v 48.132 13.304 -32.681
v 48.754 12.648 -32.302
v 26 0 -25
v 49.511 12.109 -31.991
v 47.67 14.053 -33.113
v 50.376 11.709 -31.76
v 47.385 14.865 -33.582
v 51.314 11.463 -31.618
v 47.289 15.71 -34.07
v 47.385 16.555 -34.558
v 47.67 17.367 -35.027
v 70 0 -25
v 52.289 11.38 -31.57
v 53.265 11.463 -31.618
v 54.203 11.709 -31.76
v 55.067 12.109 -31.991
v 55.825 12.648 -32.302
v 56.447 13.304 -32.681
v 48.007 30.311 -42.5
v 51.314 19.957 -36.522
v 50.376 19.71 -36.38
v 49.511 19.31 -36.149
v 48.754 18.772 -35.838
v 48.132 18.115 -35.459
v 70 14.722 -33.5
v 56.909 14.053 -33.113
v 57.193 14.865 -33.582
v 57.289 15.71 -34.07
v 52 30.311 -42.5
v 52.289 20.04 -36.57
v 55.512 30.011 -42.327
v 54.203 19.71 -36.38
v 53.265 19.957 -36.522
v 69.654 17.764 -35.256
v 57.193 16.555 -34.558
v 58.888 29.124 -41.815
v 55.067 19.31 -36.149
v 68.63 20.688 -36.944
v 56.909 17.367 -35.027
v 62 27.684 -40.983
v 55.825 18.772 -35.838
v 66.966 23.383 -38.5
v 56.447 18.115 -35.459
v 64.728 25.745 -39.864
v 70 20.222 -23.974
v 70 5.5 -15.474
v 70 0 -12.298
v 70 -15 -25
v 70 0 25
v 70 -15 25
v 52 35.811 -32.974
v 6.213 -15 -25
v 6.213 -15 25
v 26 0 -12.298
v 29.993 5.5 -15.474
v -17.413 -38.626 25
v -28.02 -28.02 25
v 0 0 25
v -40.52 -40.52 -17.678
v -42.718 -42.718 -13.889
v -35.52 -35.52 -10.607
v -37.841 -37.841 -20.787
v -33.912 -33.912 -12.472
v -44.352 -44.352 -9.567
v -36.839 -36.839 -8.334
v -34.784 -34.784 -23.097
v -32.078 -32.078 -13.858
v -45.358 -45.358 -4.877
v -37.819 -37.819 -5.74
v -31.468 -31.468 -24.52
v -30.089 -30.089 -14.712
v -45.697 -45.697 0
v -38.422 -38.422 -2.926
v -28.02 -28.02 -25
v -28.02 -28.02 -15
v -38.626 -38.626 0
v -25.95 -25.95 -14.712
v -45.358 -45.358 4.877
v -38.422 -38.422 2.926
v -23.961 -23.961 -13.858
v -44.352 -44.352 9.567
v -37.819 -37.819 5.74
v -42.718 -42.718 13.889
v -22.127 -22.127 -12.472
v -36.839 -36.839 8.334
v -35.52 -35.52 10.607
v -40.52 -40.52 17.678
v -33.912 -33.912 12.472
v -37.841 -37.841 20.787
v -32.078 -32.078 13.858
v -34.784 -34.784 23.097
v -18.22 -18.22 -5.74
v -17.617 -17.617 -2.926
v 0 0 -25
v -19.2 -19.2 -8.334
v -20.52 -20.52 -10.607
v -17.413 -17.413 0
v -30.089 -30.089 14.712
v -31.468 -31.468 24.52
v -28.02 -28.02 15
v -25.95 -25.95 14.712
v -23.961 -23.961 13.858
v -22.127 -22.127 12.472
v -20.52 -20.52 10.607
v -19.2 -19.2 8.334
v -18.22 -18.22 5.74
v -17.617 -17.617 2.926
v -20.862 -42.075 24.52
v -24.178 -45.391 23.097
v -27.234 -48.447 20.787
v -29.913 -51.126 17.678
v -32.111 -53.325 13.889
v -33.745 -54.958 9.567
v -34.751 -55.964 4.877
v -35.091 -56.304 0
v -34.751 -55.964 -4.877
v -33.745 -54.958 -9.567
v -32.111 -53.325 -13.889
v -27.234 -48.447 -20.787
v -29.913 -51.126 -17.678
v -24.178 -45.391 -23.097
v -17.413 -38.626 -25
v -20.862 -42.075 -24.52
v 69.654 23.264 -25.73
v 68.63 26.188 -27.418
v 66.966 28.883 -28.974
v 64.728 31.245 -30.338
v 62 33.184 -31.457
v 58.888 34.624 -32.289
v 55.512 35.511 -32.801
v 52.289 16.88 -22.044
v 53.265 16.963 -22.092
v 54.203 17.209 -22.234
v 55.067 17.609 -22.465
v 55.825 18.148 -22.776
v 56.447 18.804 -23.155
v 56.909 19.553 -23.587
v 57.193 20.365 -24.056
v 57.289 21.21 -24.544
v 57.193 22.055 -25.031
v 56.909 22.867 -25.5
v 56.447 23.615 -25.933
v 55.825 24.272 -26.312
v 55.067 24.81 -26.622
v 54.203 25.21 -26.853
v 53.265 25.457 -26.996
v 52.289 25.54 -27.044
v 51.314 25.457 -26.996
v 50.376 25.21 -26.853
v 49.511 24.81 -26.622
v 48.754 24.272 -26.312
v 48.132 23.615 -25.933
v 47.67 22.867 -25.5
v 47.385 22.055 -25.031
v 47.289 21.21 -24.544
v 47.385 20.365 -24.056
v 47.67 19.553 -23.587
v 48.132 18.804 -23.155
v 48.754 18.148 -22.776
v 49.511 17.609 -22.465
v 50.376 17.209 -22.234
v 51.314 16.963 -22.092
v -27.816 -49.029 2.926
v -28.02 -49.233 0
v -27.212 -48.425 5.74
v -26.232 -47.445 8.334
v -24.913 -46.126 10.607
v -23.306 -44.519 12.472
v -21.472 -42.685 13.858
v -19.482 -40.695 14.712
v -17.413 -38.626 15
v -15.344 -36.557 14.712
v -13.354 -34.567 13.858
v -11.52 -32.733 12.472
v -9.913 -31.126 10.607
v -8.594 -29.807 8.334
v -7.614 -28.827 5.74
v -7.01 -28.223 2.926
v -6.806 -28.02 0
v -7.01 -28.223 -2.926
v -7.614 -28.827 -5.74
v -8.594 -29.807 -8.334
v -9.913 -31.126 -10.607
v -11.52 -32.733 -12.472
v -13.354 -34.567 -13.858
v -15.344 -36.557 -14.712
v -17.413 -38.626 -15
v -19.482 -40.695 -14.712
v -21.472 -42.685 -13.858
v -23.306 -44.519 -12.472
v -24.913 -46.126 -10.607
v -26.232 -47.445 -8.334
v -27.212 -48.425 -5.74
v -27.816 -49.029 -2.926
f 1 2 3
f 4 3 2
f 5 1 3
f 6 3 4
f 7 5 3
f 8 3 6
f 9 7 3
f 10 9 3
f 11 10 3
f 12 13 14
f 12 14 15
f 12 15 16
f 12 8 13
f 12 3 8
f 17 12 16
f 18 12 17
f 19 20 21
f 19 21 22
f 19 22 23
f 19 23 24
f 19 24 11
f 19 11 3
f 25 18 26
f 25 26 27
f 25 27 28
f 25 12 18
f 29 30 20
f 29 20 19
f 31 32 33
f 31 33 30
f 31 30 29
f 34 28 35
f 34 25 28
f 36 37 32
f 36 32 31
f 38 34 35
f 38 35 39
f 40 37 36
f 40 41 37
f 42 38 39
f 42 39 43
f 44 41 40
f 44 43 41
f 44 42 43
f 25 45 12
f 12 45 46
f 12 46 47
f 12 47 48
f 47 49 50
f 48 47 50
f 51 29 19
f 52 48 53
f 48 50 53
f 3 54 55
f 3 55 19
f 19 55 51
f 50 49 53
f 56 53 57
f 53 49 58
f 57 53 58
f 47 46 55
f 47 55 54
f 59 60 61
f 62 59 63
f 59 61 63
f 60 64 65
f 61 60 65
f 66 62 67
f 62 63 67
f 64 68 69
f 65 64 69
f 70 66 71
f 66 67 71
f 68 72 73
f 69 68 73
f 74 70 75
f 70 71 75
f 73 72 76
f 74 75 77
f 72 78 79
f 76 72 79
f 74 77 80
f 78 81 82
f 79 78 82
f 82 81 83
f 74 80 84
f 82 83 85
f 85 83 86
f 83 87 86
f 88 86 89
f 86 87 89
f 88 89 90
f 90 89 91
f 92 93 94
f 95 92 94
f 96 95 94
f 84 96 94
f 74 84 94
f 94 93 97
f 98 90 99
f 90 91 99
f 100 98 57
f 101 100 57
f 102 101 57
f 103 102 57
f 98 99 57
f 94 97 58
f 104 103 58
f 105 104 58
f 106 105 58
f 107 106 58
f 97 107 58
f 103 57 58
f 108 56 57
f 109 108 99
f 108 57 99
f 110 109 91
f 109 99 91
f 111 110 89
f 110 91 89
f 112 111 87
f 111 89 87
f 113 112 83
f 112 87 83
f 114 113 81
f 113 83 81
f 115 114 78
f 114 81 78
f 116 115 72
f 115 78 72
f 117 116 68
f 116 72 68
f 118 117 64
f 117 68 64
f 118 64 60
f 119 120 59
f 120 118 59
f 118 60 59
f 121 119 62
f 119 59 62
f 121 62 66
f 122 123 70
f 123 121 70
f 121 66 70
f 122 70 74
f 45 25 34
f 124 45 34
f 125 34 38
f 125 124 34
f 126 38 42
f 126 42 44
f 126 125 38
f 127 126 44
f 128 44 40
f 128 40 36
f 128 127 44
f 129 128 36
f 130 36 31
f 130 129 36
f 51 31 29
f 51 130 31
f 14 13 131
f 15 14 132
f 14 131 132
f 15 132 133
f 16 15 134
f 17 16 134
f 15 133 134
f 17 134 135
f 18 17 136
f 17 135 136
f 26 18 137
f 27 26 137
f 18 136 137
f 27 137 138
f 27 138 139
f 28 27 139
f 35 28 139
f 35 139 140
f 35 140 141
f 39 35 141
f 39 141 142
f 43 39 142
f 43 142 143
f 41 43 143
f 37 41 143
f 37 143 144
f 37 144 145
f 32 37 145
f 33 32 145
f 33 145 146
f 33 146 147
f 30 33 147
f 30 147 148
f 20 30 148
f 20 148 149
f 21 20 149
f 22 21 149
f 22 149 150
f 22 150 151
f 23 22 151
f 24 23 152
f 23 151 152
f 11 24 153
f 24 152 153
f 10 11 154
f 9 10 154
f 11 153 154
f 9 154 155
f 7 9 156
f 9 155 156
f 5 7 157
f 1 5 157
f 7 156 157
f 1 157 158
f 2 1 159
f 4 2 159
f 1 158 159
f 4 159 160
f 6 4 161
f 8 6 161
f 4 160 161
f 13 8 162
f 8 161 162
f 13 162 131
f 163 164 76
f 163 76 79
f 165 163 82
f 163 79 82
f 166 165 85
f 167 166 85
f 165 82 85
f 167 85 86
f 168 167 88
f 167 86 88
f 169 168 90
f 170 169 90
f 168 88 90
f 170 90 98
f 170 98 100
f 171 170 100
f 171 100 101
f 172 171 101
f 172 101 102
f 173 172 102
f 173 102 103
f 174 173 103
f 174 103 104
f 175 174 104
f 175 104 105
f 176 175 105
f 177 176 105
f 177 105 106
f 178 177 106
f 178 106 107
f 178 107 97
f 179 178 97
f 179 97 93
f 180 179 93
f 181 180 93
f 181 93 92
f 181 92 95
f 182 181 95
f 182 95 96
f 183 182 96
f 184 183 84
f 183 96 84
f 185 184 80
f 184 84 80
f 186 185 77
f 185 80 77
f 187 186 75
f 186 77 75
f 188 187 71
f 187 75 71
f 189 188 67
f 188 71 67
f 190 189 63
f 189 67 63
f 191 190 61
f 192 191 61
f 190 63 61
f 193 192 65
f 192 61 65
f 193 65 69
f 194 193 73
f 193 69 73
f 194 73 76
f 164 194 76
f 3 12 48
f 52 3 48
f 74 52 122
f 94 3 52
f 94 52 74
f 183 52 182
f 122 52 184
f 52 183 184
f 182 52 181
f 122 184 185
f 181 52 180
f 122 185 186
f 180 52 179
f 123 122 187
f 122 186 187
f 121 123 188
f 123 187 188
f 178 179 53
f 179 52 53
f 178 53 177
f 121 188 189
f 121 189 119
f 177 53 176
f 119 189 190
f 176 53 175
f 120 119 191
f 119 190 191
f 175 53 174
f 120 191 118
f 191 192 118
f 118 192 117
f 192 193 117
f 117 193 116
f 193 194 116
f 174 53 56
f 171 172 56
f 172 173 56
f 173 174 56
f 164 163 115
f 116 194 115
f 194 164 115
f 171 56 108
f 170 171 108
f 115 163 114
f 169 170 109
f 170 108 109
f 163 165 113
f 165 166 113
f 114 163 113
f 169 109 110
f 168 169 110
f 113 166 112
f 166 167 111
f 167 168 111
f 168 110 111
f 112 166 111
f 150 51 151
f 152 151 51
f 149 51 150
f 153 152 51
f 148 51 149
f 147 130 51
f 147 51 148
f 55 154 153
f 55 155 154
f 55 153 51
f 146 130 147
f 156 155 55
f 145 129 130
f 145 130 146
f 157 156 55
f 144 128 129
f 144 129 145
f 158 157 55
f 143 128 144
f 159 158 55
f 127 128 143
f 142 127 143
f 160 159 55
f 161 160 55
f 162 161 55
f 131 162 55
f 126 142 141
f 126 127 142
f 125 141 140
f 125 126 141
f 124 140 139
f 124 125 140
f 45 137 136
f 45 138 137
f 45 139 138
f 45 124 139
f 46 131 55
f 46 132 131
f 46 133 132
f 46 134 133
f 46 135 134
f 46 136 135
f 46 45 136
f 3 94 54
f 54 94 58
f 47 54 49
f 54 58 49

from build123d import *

# Parameters (mm, degrees)
EXTRUDE_THIN1_DEPTH = 25
CUT_EXTRUDE1_REACH  = 95.408
CUT_EXTRUDE2_REACH  = 95.248
SKETCH4_R           = 15
EXTRUDE_THIN2_DEPTH = 44
FILLET2_R           = 18
CUT_EXTRUDE4_REACH  = 95.113
SKETCH8_R           = 5
CUT_EXTRUDE9_DEPTH  = 14.666666666


with BuildPart() as part:
    # Sketch1 → Extrude-Thin1 (new, symmetric)
    with BuildSketch(Plane.XY):
        Polygon((-45.961940777, -45.961940777), (0, 0), (70, 0), (70, -15), (6.213203436, -15), (-35.355339059, -56.568542495), align=None)
    extrude(amount=EXTRUDE_THIN1_DEPTH, both=True)

    # Sketch3 → Cut-Extrude1 (cut, up to next)
    with BuildSketch(Plane(origin=(0, 0, 0), x_dir=(0, 0, 1), z_dir=(-0.707106781186544, 0.7071067811865511, 0)), mode=Mode.PRIVATE) as cut_extrude1_sk1:
        with BuildLine():
            Line((-25, -39.625598043), (-40.613417223, -39.625598043))
            Line((-40.613417223, -39.625598043), (-40.613417223, -78.57107129))
            Line((-40.613417223, -78.57107129), (38.176612189, -78.57107129))
            Line((38.176612189, -78.57107129), (38.176612189, -39.625598043))
            Line((38.176612189, -39.625598043), (25, -39.625598043))
            ThreePointArc((25, -39.625598043), (0, -64.625598043), (-25, -39.625598043))
        make_face()
    cut_extrude1_tool1 = extrude(cut_extrude1_sk1.sketch, amount=-CUT_EXTRUDE1_REACH, mode=Mode.PRIVATE) & part.part
    add(cut_extrude1_tool1.solids().sort_by_distance((-28.641004, -28.641004, -32.806709))[0], mode=Mode.SUBTRACT)

    # Sketch4 → Cut-Extrude2 (cut, up to next)
    with BuildSketch(Plane(origin=(0, 0, 0), x_dir=(0, 0, 1), z_dir=(-0.707106781186544, 0.7071067811865511, 0)), mode=Mode.PRIVATE) as cut_extrude2_sk1:
        with Locations(Location((0, -39.625598043, 0), (0, 0, 270))):
            Circle(SKETCH4_R)
    cut_extrude2_tool1 = extrude(cut_extrude2_sk1.sketch, amount=-CUT_EXTRUDE2_REACH, mode=Mode.PRIVATE) & part.part
    add(cut_extrude2_tool1.solids().sort_by_distance((-28.019529, -28.019529, 0))[0], mode=Mode.SUBTRACT)

    # Sketch6 → Extrude-Thin2 (add)
    with BuildSketch(Plane(origin=(70, 0, 0), x_dir=(0, 0, -1), z_dir=(1, 0, 0))):
        Polygon((19.884546135, -8.860225997), (25, 0), (42.5, 30.310889132), (32.973720558, 35.810889132), (15.473720558, 5.5), (10.358266694, -3.360225997), align=None)
    extrude(amount=-EXTRUDE_THIN2_DEPTH)

    # Fillet2
    fillet2_edges = [part.edges().sort_by_distance(p)[0] for p in [
        (70, 33.060889132, -37.736860279),
    ]]
    fillet(fillet2_edges, radius=FILLET2_R)

    # Sketch8 → Cut-Extrude4 (cut, up to next)
    with BuildSketch(Plane(origin=(0, -5.325317547, -9.223720558), x_dir=(1, 0, 0), z_dir=(0, 0.4999999999999978, 0.86602540378444)), mode=Mode.PRIVATE) as cut_extrude4_sk1:
        with Locations(Location((52.289208075, 30.640066592, 0), (0, 0, 270))):
            Circle(SKETCH8_R)
    cut_extrude4_tool1 = extrude(cut_extrude4_sk1.sketch, amount=-CUT_EXTRUDE4_REACH, mode=Mode.PRIVATE) & part.part
    add(cut_extrude4_tool1.solids().sort_by_distance((52.289208, 21.209758, -24.543754))[0], mode=Mode.SUBTRACT)

    # Sketch10 → Cut-Extrude9 (cut, along a direction that is not the sketch's normal)
    with BuildSketch(Plane(origin=(0, -5.325317547, -9.223720558), x_dir=(1, 0, 0), z_dir=(0, 0.4999999999999978, 0.86602540378444))):
        Polygon((26, 6.149147039), (52, 47.5), (26, 47.5), align=None)
    extrude(amount=-CUT_EXTRUDE9_DEPTH, dir=(0, 0, 1), mode=Mode.SUBTRACT)


solid = part.part
